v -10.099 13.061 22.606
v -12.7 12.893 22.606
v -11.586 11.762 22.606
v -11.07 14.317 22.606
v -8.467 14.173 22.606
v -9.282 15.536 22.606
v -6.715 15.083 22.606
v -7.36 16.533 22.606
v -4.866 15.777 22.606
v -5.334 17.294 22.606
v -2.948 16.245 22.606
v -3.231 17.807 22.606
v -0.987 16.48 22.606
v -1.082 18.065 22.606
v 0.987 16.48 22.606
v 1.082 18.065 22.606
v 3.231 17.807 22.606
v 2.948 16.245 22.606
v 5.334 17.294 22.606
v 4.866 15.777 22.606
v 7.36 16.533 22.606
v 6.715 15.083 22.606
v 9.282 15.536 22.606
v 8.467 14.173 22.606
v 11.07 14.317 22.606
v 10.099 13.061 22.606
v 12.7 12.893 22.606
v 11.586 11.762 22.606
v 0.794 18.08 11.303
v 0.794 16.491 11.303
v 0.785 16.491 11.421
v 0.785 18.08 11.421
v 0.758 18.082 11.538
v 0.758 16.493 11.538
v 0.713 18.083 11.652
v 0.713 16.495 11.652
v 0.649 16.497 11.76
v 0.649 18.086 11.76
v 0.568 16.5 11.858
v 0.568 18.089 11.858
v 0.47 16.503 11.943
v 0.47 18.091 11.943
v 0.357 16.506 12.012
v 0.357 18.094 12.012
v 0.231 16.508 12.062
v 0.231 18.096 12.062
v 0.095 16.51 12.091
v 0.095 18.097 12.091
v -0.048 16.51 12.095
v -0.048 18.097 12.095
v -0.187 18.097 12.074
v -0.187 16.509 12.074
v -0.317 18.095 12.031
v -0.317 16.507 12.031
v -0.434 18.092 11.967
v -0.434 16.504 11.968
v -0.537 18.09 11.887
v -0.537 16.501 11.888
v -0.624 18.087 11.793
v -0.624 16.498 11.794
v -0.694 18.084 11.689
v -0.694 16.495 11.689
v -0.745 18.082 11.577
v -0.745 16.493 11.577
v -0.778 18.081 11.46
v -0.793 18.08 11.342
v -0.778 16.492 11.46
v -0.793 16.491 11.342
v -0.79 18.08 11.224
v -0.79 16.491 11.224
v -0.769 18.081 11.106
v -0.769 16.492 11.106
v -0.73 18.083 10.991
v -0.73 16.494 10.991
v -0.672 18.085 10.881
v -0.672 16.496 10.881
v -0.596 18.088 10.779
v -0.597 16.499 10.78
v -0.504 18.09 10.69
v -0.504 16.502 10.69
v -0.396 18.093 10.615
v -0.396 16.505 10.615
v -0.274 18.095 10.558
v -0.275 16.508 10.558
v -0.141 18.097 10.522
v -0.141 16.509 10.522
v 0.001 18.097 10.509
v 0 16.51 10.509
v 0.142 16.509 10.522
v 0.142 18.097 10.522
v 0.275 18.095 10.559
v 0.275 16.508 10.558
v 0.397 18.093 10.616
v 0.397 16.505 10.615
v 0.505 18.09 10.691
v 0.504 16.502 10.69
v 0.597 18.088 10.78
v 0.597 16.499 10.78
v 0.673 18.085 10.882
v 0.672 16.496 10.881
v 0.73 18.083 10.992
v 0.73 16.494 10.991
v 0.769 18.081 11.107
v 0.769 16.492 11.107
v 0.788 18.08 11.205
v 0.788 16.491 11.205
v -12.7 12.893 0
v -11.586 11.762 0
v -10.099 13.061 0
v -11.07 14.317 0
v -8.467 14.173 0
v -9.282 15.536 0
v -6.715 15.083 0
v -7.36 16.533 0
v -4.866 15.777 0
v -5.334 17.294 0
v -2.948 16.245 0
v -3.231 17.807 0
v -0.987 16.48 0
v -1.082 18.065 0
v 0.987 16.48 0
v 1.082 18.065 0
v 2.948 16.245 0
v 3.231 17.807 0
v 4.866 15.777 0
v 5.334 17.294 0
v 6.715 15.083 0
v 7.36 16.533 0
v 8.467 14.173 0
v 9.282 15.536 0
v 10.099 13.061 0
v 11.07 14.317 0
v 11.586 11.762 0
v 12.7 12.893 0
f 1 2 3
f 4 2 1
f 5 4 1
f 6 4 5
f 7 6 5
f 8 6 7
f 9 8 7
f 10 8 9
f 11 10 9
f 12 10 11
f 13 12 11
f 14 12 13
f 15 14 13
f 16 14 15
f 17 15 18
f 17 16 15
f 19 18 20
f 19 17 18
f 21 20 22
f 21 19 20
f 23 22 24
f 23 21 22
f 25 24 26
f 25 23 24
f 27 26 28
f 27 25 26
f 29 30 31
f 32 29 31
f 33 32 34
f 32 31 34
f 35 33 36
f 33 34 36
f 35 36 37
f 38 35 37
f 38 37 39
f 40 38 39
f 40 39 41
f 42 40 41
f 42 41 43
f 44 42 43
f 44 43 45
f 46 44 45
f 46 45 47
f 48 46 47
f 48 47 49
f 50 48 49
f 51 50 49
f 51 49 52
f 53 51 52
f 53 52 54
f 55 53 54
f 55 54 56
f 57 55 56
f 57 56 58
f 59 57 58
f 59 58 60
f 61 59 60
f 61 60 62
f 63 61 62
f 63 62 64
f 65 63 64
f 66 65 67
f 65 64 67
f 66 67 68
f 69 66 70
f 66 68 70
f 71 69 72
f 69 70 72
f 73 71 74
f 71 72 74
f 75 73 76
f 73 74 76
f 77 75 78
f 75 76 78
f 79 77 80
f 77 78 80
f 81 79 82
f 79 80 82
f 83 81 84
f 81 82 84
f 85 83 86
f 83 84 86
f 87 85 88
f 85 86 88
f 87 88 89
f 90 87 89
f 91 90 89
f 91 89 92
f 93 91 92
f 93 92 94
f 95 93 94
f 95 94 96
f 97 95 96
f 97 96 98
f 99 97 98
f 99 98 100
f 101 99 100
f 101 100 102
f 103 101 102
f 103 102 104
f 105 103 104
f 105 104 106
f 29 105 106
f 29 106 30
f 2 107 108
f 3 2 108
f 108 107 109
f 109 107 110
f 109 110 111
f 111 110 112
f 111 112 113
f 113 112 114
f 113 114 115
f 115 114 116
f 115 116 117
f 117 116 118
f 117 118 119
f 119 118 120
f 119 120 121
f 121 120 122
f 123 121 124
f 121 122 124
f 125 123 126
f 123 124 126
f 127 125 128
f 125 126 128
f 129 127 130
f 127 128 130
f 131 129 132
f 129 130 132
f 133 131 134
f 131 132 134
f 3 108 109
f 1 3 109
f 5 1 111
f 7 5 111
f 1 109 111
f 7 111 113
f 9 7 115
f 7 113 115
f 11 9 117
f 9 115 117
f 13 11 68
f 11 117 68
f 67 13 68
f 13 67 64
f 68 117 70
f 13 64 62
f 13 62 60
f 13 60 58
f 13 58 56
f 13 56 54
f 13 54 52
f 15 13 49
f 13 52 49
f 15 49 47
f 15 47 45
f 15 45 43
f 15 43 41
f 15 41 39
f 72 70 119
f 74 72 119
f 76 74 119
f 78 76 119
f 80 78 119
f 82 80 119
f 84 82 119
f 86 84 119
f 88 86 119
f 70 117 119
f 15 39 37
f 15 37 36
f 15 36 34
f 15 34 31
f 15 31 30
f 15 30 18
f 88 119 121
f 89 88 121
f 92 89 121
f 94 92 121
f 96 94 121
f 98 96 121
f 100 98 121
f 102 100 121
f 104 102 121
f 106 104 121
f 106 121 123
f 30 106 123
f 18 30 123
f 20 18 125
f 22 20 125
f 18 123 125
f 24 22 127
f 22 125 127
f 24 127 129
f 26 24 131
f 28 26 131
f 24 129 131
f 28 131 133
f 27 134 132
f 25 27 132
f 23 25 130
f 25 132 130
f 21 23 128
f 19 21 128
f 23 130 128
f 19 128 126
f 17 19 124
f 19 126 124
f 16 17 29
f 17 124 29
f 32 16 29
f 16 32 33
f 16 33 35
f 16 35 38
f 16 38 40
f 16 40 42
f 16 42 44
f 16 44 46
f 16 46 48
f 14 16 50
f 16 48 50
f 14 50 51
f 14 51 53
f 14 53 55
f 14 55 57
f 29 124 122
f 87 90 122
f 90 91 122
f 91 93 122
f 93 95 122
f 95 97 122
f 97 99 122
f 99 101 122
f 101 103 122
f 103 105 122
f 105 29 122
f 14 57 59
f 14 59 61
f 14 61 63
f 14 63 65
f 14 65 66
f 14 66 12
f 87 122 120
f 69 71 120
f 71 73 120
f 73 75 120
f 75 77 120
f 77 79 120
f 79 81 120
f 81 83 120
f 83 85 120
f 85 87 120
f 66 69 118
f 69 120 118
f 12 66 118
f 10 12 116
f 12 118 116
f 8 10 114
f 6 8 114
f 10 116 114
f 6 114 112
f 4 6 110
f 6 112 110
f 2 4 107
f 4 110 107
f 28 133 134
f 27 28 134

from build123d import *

# Parameters (mm, degrees)
F1_DEPTH = 22.606
F2_R     = 0.79375
F3_DEPTH = 19.0975001


with BuildPart() as f1:
    # F0 (on Top) → F1 (new body)
    with BuildSketch(Plane.XY):
        with BuildLine():
            ThreePointArc((-11.5859649124, 11.762037113), (0, 16.51), (11.5859649124, 11.762037113))
            Line((11.5859649124, 11.762037113), (12.7000000001, 12.8930022201))
            ThreePointArc((12.7000000001, 12.8930022201), (0, 18.0975), (-12.7000000001, 12.8930022201))
            Line((-12.7000000001, 12.8930022201), (-11.5859649124, 11.762037113))
        make_face()
    extrude(amount=F1_DEPTH)

    # F2 (on Front) → F3 (cut, up to face)
    with BuildSketch(Plane.XZ):
        with Locations((0, 11.303)):
            Circle(F2_R)
    extrude(amount=-F3_DEPTH, mode=Mode.SUBTRACT)


solid = f1.part
